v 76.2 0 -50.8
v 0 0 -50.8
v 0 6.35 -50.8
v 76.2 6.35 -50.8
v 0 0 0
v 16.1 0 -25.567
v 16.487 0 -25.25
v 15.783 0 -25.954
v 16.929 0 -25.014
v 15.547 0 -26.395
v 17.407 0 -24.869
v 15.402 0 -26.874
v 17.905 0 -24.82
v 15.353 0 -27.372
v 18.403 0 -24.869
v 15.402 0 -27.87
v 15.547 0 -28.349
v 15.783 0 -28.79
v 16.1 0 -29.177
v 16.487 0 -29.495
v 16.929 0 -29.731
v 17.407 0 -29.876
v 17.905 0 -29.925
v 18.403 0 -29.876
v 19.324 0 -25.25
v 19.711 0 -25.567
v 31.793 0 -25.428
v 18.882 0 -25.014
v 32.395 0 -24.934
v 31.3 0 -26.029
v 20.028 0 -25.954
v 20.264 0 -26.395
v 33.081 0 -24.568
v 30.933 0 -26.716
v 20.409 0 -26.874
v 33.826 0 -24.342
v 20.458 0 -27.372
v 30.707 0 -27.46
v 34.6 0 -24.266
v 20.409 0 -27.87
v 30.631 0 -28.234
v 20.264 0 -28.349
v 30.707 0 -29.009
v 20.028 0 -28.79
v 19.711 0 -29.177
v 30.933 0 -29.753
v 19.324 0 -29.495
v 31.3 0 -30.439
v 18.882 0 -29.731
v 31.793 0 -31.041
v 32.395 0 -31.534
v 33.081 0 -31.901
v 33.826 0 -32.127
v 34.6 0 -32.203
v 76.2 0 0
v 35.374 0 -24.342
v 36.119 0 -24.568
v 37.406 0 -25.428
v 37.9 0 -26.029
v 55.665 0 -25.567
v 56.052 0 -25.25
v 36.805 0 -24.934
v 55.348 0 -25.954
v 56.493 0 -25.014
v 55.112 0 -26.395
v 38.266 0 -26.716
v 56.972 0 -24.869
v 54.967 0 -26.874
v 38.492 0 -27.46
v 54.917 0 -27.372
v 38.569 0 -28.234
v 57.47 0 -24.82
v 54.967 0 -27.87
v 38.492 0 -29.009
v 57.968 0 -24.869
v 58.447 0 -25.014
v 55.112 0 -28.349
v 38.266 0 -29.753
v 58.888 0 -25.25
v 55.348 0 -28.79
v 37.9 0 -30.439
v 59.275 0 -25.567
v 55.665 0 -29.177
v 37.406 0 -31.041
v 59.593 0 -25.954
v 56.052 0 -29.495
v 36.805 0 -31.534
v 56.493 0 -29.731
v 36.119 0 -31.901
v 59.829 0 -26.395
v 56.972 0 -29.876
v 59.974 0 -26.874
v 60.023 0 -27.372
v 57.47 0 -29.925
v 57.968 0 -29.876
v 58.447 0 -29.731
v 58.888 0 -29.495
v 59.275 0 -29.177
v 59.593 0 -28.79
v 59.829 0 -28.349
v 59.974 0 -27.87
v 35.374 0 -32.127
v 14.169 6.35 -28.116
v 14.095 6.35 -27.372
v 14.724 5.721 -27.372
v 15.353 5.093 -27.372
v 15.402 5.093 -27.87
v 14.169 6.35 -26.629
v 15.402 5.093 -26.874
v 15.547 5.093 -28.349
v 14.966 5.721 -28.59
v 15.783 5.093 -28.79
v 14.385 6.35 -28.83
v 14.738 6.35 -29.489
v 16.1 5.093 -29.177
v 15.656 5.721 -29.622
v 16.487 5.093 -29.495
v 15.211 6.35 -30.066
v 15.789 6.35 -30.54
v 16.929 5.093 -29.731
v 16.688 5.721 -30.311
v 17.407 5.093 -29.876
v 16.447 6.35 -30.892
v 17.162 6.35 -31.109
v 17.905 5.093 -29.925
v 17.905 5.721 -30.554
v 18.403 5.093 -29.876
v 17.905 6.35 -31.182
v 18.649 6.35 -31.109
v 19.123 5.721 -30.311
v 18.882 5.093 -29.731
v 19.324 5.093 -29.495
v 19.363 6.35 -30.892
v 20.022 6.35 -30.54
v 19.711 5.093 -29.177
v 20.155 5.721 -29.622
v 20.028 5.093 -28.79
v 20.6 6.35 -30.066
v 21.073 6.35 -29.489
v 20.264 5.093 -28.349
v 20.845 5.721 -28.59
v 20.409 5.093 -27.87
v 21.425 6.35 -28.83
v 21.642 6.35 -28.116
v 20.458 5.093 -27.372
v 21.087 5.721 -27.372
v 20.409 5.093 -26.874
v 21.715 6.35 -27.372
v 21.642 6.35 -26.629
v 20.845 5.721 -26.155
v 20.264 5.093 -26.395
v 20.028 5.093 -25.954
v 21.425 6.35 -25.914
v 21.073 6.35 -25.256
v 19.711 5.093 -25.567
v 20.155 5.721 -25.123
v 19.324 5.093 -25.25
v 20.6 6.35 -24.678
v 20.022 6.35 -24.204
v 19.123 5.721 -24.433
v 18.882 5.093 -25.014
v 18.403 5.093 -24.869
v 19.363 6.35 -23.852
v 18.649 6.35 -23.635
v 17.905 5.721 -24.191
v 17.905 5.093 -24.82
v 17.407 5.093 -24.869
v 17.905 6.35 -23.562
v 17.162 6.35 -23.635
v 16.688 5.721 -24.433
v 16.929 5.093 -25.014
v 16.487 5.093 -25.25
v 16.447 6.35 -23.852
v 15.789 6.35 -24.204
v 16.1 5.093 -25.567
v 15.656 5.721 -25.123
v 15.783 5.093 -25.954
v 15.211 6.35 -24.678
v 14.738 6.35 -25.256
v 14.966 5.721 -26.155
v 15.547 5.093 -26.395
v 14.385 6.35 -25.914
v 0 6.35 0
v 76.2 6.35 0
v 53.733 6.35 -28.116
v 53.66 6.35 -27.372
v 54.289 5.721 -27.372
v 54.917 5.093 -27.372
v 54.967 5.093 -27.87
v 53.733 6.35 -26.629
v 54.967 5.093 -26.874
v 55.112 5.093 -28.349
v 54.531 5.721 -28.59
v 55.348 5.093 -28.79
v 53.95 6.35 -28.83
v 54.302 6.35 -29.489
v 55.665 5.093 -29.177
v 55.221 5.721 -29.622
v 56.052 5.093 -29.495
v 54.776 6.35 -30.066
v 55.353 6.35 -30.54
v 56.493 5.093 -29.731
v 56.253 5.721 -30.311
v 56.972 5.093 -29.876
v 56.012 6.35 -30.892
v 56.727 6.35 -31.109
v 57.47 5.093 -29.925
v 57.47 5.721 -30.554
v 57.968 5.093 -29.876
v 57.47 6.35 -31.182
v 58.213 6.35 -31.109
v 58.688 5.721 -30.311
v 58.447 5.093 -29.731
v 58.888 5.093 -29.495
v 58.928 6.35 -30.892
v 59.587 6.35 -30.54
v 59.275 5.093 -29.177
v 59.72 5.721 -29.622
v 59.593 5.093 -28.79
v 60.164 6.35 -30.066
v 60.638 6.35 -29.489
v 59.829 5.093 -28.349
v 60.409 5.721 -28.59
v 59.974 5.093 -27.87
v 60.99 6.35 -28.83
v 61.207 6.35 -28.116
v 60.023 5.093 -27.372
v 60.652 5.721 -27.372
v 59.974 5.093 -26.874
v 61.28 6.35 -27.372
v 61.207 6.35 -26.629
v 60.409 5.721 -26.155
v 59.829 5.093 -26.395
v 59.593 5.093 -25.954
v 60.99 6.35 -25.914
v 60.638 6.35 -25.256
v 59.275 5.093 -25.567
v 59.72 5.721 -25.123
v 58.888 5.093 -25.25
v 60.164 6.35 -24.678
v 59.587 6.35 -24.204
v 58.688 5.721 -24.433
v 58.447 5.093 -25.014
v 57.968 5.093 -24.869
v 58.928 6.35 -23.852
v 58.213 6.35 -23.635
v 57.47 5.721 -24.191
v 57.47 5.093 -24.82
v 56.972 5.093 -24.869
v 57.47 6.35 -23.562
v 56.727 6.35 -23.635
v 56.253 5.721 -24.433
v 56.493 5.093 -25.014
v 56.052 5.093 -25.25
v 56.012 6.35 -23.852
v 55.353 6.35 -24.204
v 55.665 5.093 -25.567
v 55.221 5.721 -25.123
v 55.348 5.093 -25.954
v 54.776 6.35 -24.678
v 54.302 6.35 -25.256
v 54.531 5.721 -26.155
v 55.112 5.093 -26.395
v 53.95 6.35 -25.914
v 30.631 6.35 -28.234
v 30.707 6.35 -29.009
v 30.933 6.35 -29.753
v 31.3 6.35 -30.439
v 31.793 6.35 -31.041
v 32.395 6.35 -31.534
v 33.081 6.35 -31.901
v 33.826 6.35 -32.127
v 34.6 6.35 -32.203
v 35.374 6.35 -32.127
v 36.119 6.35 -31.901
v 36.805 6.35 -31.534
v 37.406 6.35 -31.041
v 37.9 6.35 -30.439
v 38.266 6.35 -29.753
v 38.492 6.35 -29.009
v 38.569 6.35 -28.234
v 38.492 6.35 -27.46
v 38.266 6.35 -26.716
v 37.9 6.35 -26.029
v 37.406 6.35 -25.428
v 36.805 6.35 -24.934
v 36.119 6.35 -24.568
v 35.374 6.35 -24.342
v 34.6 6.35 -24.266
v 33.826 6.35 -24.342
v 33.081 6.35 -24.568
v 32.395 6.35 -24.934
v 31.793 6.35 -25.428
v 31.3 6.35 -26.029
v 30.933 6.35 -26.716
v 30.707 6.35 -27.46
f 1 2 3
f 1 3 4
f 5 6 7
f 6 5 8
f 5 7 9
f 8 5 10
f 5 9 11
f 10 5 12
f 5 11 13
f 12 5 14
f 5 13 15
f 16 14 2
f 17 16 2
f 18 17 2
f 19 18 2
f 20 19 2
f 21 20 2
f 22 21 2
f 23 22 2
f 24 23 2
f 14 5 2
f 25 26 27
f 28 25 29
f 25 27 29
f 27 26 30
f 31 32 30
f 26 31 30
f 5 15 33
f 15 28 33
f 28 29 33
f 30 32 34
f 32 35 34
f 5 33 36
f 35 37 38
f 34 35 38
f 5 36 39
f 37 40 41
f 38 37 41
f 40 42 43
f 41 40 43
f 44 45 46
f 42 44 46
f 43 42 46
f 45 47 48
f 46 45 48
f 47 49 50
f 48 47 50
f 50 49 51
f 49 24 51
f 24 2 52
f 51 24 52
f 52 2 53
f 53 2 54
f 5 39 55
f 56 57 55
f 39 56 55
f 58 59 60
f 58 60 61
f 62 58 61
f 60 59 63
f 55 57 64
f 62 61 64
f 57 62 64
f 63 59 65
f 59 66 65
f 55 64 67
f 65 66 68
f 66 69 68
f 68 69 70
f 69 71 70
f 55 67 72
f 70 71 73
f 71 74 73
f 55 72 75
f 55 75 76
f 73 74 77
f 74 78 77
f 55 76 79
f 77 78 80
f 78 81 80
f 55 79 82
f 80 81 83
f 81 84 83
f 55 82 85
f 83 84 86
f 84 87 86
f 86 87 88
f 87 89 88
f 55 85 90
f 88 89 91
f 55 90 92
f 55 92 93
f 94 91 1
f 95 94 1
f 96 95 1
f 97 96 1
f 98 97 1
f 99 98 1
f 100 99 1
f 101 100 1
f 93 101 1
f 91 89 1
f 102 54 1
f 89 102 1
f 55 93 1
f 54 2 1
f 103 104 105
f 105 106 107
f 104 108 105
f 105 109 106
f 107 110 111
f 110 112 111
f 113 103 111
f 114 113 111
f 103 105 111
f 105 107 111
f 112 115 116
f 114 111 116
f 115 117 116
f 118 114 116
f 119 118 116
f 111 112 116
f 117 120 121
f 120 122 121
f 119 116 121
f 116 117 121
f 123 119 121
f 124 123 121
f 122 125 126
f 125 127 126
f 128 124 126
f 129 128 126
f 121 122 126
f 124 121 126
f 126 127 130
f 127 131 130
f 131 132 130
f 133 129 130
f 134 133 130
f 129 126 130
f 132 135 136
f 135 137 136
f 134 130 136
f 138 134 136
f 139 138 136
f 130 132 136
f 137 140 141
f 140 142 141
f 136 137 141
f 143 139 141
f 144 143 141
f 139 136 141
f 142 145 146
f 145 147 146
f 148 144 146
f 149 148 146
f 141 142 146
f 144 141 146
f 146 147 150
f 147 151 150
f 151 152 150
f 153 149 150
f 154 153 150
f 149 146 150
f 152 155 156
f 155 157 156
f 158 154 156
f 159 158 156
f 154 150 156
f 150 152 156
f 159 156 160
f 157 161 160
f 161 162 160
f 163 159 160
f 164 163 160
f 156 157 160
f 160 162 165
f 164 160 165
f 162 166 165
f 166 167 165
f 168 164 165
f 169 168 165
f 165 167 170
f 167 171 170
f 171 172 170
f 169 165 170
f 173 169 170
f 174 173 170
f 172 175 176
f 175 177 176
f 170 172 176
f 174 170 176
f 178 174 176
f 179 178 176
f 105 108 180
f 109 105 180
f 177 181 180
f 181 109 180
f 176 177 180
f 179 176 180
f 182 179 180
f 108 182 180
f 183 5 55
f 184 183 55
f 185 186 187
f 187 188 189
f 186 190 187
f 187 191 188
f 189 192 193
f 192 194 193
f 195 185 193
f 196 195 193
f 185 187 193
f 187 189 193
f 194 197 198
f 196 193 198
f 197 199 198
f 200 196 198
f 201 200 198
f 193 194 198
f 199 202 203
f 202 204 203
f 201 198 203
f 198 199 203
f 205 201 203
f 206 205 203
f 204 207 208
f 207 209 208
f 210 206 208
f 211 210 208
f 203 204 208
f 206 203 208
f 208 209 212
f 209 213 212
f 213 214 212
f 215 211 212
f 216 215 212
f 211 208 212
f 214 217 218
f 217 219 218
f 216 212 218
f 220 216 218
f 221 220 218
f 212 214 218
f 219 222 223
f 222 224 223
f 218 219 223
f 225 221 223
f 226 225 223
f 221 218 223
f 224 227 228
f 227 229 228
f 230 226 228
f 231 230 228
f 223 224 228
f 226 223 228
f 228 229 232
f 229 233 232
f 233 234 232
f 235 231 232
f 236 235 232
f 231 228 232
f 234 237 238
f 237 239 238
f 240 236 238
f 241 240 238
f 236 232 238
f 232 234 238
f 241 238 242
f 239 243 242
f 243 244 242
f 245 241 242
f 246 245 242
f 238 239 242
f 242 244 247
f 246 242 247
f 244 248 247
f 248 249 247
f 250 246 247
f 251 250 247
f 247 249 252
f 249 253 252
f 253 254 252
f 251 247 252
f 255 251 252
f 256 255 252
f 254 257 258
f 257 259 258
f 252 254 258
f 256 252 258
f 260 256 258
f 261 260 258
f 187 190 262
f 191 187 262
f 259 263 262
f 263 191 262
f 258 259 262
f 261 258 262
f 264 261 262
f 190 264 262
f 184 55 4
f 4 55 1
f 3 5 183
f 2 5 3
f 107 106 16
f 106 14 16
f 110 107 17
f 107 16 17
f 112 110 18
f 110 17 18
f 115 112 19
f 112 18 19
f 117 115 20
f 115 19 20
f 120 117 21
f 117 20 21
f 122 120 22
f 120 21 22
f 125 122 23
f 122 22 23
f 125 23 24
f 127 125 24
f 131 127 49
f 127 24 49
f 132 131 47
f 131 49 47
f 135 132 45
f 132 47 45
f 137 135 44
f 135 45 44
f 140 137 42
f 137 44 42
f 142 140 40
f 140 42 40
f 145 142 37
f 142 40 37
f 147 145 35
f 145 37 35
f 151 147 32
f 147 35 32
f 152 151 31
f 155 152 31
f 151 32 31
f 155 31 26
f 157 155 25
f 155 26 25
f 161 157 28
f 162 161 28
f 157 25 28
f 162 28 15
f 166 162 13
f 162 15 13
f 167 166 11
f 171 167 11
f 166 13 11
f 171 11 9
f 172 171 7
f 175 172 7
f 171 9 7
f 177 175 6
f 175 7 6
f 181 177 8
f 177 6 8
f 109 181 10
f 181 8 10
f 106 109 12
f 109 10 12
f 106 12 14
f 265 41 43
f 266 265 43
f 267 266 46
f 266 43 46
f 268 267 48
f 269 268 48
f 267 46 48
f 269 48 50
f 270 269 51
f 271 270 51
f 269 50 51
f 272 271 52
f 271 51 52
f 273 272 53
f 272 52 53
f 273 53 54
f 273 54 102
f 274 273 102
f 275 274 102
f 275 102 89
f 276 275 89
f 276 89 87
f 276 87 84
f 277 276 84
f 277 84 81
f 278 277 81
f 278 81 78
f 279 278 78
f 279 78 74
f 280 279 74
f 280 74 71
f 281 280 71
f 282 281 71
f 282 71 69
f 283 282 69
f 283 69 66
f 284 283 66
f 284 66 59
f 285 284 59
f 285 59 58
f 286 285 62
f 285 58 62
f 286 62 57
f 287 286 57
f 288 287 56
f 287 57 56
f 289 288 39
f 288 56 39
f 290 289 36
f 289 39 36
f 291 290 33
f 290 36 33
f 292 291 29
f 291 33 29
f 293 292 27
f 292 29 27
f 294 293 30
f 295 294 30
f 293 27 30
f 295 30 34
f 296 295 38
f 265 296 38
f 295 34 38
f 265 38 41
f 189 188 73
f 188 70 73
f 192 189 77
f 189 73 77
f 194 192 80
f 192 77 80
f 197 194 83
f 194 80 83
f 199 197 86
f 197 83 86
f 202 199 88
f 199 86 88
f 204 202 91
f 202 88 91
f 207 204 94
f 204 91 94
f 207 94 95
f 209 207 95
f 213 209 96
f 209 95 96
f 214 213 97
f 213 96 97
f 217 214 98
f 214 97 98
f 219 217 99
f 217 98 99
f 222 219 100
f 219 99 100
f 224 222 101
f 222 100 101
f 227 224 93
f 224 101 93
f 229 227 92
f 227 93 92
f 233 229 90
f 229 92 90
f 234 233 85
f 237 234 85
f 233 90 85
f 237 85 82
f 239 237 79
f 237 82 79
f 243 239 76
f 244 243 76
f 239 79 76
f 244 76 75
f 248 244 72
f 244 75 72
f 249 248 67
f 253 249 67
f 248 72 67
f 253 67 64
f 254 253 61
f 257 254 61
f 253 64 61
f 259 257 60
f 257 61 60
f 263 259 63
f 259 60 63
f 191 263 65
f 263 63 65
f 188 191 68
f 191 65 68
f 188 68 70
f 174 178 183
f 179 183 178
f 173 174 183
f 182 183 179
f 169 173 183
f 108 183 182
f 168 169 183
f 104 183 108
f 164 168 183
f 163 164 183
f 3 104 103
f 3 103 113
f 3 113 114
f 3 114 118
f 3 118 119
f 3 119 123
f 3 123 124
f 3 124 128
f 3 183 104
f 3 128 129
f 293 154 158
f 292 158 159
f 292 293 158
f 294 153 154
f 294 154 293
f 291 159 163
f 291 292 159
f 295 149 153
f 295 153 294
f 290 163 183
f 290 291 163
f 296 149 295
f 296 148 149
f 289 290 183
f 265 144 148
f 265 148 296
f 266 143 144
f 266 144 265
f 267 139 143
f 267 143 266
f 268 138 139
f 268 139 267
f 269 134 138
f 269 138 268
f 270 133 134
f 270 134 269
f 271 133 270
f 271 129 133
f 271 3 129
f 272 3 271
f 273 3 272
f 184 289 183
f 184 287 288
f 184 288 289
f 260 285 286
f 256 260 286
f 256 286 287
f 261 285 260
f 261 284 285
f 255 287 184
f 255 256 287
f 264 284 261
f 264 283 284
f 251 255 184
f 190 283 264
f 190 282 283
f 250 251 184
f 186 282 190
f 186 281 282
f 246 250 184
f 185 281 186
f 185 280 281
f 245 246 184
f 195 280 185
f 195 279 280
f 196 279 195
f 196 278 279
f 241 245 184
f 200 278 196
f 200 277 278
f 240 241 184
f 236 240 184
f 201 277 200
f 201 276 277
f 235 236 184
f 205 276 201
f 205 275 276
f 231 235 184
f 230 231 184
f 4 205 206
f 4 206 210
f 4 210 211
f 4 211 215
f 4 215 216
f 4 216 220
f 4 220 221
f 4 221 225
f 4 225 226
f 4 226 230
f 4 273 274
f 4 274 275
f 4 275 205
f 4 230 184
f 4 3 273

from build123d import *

# Parameters (mm, degrees)
SKETCH1_W                         = 76.2
SKETCH1_H                         = 50.8
BOSS_EXTRUDE1_DEPTH               = 6.35
F_1_4_20_TAPPED_HOLE1_D           = 5.1054
F_1_4_20_TAPPED_HOLE1_CSINK_D     = 7.62
F_1_4_20_TAPPED_HOLE1_CSINK_ANGLE = 90
F_3_8_16_TAPPED_HOLE1_D           = 7.9375


with BuildPart() as part:
    # Sketch1 → Boss-Extrude1 (new body)
    with BuildSketch(Plane(origin=(0, 0, 0), x_dir=(1, 0, 0), z_dir=(0, 1, 0))):
        with Locations((38.1, 25.4)):
            Rectangle(SKETCH1_W, SKETCH1_H)
    extrude(amount=BOSS_EXTRUDE1_DEPTH)

    # 1/4-20 Tapped Hole1 (through all)
    with Locations(Plane(origin=(0, 6.35, 0), x_dir=(1, 0, 0), z_dir=(0, 1, 0))):
        with Locations((17.905473556, 27.372280114), (57.470157442, 27.372280114)):
            CounterSinkHole(F_1_4_20_TAPPED_HOLE1_D / 2, F_1_4_20_TAPPED_HOLE1_CSINK_D / 2, counter_sink_angle=F_1_4_20_TAPPED_HOLE1_CSINK_ANGLE)

    # 3/8-16 Tapped Hole1 (through all)
    with Locations(Plane(origin=(0, 6.35, 0), x_dir=(1, 0, 0), z_dir=(0, 1, 0))):
        with Locations((34.599788687, 28.23429671)):
            Hole(F_3_8_16_TAPPED_HOLE1_D / 2)


solid = part.part
